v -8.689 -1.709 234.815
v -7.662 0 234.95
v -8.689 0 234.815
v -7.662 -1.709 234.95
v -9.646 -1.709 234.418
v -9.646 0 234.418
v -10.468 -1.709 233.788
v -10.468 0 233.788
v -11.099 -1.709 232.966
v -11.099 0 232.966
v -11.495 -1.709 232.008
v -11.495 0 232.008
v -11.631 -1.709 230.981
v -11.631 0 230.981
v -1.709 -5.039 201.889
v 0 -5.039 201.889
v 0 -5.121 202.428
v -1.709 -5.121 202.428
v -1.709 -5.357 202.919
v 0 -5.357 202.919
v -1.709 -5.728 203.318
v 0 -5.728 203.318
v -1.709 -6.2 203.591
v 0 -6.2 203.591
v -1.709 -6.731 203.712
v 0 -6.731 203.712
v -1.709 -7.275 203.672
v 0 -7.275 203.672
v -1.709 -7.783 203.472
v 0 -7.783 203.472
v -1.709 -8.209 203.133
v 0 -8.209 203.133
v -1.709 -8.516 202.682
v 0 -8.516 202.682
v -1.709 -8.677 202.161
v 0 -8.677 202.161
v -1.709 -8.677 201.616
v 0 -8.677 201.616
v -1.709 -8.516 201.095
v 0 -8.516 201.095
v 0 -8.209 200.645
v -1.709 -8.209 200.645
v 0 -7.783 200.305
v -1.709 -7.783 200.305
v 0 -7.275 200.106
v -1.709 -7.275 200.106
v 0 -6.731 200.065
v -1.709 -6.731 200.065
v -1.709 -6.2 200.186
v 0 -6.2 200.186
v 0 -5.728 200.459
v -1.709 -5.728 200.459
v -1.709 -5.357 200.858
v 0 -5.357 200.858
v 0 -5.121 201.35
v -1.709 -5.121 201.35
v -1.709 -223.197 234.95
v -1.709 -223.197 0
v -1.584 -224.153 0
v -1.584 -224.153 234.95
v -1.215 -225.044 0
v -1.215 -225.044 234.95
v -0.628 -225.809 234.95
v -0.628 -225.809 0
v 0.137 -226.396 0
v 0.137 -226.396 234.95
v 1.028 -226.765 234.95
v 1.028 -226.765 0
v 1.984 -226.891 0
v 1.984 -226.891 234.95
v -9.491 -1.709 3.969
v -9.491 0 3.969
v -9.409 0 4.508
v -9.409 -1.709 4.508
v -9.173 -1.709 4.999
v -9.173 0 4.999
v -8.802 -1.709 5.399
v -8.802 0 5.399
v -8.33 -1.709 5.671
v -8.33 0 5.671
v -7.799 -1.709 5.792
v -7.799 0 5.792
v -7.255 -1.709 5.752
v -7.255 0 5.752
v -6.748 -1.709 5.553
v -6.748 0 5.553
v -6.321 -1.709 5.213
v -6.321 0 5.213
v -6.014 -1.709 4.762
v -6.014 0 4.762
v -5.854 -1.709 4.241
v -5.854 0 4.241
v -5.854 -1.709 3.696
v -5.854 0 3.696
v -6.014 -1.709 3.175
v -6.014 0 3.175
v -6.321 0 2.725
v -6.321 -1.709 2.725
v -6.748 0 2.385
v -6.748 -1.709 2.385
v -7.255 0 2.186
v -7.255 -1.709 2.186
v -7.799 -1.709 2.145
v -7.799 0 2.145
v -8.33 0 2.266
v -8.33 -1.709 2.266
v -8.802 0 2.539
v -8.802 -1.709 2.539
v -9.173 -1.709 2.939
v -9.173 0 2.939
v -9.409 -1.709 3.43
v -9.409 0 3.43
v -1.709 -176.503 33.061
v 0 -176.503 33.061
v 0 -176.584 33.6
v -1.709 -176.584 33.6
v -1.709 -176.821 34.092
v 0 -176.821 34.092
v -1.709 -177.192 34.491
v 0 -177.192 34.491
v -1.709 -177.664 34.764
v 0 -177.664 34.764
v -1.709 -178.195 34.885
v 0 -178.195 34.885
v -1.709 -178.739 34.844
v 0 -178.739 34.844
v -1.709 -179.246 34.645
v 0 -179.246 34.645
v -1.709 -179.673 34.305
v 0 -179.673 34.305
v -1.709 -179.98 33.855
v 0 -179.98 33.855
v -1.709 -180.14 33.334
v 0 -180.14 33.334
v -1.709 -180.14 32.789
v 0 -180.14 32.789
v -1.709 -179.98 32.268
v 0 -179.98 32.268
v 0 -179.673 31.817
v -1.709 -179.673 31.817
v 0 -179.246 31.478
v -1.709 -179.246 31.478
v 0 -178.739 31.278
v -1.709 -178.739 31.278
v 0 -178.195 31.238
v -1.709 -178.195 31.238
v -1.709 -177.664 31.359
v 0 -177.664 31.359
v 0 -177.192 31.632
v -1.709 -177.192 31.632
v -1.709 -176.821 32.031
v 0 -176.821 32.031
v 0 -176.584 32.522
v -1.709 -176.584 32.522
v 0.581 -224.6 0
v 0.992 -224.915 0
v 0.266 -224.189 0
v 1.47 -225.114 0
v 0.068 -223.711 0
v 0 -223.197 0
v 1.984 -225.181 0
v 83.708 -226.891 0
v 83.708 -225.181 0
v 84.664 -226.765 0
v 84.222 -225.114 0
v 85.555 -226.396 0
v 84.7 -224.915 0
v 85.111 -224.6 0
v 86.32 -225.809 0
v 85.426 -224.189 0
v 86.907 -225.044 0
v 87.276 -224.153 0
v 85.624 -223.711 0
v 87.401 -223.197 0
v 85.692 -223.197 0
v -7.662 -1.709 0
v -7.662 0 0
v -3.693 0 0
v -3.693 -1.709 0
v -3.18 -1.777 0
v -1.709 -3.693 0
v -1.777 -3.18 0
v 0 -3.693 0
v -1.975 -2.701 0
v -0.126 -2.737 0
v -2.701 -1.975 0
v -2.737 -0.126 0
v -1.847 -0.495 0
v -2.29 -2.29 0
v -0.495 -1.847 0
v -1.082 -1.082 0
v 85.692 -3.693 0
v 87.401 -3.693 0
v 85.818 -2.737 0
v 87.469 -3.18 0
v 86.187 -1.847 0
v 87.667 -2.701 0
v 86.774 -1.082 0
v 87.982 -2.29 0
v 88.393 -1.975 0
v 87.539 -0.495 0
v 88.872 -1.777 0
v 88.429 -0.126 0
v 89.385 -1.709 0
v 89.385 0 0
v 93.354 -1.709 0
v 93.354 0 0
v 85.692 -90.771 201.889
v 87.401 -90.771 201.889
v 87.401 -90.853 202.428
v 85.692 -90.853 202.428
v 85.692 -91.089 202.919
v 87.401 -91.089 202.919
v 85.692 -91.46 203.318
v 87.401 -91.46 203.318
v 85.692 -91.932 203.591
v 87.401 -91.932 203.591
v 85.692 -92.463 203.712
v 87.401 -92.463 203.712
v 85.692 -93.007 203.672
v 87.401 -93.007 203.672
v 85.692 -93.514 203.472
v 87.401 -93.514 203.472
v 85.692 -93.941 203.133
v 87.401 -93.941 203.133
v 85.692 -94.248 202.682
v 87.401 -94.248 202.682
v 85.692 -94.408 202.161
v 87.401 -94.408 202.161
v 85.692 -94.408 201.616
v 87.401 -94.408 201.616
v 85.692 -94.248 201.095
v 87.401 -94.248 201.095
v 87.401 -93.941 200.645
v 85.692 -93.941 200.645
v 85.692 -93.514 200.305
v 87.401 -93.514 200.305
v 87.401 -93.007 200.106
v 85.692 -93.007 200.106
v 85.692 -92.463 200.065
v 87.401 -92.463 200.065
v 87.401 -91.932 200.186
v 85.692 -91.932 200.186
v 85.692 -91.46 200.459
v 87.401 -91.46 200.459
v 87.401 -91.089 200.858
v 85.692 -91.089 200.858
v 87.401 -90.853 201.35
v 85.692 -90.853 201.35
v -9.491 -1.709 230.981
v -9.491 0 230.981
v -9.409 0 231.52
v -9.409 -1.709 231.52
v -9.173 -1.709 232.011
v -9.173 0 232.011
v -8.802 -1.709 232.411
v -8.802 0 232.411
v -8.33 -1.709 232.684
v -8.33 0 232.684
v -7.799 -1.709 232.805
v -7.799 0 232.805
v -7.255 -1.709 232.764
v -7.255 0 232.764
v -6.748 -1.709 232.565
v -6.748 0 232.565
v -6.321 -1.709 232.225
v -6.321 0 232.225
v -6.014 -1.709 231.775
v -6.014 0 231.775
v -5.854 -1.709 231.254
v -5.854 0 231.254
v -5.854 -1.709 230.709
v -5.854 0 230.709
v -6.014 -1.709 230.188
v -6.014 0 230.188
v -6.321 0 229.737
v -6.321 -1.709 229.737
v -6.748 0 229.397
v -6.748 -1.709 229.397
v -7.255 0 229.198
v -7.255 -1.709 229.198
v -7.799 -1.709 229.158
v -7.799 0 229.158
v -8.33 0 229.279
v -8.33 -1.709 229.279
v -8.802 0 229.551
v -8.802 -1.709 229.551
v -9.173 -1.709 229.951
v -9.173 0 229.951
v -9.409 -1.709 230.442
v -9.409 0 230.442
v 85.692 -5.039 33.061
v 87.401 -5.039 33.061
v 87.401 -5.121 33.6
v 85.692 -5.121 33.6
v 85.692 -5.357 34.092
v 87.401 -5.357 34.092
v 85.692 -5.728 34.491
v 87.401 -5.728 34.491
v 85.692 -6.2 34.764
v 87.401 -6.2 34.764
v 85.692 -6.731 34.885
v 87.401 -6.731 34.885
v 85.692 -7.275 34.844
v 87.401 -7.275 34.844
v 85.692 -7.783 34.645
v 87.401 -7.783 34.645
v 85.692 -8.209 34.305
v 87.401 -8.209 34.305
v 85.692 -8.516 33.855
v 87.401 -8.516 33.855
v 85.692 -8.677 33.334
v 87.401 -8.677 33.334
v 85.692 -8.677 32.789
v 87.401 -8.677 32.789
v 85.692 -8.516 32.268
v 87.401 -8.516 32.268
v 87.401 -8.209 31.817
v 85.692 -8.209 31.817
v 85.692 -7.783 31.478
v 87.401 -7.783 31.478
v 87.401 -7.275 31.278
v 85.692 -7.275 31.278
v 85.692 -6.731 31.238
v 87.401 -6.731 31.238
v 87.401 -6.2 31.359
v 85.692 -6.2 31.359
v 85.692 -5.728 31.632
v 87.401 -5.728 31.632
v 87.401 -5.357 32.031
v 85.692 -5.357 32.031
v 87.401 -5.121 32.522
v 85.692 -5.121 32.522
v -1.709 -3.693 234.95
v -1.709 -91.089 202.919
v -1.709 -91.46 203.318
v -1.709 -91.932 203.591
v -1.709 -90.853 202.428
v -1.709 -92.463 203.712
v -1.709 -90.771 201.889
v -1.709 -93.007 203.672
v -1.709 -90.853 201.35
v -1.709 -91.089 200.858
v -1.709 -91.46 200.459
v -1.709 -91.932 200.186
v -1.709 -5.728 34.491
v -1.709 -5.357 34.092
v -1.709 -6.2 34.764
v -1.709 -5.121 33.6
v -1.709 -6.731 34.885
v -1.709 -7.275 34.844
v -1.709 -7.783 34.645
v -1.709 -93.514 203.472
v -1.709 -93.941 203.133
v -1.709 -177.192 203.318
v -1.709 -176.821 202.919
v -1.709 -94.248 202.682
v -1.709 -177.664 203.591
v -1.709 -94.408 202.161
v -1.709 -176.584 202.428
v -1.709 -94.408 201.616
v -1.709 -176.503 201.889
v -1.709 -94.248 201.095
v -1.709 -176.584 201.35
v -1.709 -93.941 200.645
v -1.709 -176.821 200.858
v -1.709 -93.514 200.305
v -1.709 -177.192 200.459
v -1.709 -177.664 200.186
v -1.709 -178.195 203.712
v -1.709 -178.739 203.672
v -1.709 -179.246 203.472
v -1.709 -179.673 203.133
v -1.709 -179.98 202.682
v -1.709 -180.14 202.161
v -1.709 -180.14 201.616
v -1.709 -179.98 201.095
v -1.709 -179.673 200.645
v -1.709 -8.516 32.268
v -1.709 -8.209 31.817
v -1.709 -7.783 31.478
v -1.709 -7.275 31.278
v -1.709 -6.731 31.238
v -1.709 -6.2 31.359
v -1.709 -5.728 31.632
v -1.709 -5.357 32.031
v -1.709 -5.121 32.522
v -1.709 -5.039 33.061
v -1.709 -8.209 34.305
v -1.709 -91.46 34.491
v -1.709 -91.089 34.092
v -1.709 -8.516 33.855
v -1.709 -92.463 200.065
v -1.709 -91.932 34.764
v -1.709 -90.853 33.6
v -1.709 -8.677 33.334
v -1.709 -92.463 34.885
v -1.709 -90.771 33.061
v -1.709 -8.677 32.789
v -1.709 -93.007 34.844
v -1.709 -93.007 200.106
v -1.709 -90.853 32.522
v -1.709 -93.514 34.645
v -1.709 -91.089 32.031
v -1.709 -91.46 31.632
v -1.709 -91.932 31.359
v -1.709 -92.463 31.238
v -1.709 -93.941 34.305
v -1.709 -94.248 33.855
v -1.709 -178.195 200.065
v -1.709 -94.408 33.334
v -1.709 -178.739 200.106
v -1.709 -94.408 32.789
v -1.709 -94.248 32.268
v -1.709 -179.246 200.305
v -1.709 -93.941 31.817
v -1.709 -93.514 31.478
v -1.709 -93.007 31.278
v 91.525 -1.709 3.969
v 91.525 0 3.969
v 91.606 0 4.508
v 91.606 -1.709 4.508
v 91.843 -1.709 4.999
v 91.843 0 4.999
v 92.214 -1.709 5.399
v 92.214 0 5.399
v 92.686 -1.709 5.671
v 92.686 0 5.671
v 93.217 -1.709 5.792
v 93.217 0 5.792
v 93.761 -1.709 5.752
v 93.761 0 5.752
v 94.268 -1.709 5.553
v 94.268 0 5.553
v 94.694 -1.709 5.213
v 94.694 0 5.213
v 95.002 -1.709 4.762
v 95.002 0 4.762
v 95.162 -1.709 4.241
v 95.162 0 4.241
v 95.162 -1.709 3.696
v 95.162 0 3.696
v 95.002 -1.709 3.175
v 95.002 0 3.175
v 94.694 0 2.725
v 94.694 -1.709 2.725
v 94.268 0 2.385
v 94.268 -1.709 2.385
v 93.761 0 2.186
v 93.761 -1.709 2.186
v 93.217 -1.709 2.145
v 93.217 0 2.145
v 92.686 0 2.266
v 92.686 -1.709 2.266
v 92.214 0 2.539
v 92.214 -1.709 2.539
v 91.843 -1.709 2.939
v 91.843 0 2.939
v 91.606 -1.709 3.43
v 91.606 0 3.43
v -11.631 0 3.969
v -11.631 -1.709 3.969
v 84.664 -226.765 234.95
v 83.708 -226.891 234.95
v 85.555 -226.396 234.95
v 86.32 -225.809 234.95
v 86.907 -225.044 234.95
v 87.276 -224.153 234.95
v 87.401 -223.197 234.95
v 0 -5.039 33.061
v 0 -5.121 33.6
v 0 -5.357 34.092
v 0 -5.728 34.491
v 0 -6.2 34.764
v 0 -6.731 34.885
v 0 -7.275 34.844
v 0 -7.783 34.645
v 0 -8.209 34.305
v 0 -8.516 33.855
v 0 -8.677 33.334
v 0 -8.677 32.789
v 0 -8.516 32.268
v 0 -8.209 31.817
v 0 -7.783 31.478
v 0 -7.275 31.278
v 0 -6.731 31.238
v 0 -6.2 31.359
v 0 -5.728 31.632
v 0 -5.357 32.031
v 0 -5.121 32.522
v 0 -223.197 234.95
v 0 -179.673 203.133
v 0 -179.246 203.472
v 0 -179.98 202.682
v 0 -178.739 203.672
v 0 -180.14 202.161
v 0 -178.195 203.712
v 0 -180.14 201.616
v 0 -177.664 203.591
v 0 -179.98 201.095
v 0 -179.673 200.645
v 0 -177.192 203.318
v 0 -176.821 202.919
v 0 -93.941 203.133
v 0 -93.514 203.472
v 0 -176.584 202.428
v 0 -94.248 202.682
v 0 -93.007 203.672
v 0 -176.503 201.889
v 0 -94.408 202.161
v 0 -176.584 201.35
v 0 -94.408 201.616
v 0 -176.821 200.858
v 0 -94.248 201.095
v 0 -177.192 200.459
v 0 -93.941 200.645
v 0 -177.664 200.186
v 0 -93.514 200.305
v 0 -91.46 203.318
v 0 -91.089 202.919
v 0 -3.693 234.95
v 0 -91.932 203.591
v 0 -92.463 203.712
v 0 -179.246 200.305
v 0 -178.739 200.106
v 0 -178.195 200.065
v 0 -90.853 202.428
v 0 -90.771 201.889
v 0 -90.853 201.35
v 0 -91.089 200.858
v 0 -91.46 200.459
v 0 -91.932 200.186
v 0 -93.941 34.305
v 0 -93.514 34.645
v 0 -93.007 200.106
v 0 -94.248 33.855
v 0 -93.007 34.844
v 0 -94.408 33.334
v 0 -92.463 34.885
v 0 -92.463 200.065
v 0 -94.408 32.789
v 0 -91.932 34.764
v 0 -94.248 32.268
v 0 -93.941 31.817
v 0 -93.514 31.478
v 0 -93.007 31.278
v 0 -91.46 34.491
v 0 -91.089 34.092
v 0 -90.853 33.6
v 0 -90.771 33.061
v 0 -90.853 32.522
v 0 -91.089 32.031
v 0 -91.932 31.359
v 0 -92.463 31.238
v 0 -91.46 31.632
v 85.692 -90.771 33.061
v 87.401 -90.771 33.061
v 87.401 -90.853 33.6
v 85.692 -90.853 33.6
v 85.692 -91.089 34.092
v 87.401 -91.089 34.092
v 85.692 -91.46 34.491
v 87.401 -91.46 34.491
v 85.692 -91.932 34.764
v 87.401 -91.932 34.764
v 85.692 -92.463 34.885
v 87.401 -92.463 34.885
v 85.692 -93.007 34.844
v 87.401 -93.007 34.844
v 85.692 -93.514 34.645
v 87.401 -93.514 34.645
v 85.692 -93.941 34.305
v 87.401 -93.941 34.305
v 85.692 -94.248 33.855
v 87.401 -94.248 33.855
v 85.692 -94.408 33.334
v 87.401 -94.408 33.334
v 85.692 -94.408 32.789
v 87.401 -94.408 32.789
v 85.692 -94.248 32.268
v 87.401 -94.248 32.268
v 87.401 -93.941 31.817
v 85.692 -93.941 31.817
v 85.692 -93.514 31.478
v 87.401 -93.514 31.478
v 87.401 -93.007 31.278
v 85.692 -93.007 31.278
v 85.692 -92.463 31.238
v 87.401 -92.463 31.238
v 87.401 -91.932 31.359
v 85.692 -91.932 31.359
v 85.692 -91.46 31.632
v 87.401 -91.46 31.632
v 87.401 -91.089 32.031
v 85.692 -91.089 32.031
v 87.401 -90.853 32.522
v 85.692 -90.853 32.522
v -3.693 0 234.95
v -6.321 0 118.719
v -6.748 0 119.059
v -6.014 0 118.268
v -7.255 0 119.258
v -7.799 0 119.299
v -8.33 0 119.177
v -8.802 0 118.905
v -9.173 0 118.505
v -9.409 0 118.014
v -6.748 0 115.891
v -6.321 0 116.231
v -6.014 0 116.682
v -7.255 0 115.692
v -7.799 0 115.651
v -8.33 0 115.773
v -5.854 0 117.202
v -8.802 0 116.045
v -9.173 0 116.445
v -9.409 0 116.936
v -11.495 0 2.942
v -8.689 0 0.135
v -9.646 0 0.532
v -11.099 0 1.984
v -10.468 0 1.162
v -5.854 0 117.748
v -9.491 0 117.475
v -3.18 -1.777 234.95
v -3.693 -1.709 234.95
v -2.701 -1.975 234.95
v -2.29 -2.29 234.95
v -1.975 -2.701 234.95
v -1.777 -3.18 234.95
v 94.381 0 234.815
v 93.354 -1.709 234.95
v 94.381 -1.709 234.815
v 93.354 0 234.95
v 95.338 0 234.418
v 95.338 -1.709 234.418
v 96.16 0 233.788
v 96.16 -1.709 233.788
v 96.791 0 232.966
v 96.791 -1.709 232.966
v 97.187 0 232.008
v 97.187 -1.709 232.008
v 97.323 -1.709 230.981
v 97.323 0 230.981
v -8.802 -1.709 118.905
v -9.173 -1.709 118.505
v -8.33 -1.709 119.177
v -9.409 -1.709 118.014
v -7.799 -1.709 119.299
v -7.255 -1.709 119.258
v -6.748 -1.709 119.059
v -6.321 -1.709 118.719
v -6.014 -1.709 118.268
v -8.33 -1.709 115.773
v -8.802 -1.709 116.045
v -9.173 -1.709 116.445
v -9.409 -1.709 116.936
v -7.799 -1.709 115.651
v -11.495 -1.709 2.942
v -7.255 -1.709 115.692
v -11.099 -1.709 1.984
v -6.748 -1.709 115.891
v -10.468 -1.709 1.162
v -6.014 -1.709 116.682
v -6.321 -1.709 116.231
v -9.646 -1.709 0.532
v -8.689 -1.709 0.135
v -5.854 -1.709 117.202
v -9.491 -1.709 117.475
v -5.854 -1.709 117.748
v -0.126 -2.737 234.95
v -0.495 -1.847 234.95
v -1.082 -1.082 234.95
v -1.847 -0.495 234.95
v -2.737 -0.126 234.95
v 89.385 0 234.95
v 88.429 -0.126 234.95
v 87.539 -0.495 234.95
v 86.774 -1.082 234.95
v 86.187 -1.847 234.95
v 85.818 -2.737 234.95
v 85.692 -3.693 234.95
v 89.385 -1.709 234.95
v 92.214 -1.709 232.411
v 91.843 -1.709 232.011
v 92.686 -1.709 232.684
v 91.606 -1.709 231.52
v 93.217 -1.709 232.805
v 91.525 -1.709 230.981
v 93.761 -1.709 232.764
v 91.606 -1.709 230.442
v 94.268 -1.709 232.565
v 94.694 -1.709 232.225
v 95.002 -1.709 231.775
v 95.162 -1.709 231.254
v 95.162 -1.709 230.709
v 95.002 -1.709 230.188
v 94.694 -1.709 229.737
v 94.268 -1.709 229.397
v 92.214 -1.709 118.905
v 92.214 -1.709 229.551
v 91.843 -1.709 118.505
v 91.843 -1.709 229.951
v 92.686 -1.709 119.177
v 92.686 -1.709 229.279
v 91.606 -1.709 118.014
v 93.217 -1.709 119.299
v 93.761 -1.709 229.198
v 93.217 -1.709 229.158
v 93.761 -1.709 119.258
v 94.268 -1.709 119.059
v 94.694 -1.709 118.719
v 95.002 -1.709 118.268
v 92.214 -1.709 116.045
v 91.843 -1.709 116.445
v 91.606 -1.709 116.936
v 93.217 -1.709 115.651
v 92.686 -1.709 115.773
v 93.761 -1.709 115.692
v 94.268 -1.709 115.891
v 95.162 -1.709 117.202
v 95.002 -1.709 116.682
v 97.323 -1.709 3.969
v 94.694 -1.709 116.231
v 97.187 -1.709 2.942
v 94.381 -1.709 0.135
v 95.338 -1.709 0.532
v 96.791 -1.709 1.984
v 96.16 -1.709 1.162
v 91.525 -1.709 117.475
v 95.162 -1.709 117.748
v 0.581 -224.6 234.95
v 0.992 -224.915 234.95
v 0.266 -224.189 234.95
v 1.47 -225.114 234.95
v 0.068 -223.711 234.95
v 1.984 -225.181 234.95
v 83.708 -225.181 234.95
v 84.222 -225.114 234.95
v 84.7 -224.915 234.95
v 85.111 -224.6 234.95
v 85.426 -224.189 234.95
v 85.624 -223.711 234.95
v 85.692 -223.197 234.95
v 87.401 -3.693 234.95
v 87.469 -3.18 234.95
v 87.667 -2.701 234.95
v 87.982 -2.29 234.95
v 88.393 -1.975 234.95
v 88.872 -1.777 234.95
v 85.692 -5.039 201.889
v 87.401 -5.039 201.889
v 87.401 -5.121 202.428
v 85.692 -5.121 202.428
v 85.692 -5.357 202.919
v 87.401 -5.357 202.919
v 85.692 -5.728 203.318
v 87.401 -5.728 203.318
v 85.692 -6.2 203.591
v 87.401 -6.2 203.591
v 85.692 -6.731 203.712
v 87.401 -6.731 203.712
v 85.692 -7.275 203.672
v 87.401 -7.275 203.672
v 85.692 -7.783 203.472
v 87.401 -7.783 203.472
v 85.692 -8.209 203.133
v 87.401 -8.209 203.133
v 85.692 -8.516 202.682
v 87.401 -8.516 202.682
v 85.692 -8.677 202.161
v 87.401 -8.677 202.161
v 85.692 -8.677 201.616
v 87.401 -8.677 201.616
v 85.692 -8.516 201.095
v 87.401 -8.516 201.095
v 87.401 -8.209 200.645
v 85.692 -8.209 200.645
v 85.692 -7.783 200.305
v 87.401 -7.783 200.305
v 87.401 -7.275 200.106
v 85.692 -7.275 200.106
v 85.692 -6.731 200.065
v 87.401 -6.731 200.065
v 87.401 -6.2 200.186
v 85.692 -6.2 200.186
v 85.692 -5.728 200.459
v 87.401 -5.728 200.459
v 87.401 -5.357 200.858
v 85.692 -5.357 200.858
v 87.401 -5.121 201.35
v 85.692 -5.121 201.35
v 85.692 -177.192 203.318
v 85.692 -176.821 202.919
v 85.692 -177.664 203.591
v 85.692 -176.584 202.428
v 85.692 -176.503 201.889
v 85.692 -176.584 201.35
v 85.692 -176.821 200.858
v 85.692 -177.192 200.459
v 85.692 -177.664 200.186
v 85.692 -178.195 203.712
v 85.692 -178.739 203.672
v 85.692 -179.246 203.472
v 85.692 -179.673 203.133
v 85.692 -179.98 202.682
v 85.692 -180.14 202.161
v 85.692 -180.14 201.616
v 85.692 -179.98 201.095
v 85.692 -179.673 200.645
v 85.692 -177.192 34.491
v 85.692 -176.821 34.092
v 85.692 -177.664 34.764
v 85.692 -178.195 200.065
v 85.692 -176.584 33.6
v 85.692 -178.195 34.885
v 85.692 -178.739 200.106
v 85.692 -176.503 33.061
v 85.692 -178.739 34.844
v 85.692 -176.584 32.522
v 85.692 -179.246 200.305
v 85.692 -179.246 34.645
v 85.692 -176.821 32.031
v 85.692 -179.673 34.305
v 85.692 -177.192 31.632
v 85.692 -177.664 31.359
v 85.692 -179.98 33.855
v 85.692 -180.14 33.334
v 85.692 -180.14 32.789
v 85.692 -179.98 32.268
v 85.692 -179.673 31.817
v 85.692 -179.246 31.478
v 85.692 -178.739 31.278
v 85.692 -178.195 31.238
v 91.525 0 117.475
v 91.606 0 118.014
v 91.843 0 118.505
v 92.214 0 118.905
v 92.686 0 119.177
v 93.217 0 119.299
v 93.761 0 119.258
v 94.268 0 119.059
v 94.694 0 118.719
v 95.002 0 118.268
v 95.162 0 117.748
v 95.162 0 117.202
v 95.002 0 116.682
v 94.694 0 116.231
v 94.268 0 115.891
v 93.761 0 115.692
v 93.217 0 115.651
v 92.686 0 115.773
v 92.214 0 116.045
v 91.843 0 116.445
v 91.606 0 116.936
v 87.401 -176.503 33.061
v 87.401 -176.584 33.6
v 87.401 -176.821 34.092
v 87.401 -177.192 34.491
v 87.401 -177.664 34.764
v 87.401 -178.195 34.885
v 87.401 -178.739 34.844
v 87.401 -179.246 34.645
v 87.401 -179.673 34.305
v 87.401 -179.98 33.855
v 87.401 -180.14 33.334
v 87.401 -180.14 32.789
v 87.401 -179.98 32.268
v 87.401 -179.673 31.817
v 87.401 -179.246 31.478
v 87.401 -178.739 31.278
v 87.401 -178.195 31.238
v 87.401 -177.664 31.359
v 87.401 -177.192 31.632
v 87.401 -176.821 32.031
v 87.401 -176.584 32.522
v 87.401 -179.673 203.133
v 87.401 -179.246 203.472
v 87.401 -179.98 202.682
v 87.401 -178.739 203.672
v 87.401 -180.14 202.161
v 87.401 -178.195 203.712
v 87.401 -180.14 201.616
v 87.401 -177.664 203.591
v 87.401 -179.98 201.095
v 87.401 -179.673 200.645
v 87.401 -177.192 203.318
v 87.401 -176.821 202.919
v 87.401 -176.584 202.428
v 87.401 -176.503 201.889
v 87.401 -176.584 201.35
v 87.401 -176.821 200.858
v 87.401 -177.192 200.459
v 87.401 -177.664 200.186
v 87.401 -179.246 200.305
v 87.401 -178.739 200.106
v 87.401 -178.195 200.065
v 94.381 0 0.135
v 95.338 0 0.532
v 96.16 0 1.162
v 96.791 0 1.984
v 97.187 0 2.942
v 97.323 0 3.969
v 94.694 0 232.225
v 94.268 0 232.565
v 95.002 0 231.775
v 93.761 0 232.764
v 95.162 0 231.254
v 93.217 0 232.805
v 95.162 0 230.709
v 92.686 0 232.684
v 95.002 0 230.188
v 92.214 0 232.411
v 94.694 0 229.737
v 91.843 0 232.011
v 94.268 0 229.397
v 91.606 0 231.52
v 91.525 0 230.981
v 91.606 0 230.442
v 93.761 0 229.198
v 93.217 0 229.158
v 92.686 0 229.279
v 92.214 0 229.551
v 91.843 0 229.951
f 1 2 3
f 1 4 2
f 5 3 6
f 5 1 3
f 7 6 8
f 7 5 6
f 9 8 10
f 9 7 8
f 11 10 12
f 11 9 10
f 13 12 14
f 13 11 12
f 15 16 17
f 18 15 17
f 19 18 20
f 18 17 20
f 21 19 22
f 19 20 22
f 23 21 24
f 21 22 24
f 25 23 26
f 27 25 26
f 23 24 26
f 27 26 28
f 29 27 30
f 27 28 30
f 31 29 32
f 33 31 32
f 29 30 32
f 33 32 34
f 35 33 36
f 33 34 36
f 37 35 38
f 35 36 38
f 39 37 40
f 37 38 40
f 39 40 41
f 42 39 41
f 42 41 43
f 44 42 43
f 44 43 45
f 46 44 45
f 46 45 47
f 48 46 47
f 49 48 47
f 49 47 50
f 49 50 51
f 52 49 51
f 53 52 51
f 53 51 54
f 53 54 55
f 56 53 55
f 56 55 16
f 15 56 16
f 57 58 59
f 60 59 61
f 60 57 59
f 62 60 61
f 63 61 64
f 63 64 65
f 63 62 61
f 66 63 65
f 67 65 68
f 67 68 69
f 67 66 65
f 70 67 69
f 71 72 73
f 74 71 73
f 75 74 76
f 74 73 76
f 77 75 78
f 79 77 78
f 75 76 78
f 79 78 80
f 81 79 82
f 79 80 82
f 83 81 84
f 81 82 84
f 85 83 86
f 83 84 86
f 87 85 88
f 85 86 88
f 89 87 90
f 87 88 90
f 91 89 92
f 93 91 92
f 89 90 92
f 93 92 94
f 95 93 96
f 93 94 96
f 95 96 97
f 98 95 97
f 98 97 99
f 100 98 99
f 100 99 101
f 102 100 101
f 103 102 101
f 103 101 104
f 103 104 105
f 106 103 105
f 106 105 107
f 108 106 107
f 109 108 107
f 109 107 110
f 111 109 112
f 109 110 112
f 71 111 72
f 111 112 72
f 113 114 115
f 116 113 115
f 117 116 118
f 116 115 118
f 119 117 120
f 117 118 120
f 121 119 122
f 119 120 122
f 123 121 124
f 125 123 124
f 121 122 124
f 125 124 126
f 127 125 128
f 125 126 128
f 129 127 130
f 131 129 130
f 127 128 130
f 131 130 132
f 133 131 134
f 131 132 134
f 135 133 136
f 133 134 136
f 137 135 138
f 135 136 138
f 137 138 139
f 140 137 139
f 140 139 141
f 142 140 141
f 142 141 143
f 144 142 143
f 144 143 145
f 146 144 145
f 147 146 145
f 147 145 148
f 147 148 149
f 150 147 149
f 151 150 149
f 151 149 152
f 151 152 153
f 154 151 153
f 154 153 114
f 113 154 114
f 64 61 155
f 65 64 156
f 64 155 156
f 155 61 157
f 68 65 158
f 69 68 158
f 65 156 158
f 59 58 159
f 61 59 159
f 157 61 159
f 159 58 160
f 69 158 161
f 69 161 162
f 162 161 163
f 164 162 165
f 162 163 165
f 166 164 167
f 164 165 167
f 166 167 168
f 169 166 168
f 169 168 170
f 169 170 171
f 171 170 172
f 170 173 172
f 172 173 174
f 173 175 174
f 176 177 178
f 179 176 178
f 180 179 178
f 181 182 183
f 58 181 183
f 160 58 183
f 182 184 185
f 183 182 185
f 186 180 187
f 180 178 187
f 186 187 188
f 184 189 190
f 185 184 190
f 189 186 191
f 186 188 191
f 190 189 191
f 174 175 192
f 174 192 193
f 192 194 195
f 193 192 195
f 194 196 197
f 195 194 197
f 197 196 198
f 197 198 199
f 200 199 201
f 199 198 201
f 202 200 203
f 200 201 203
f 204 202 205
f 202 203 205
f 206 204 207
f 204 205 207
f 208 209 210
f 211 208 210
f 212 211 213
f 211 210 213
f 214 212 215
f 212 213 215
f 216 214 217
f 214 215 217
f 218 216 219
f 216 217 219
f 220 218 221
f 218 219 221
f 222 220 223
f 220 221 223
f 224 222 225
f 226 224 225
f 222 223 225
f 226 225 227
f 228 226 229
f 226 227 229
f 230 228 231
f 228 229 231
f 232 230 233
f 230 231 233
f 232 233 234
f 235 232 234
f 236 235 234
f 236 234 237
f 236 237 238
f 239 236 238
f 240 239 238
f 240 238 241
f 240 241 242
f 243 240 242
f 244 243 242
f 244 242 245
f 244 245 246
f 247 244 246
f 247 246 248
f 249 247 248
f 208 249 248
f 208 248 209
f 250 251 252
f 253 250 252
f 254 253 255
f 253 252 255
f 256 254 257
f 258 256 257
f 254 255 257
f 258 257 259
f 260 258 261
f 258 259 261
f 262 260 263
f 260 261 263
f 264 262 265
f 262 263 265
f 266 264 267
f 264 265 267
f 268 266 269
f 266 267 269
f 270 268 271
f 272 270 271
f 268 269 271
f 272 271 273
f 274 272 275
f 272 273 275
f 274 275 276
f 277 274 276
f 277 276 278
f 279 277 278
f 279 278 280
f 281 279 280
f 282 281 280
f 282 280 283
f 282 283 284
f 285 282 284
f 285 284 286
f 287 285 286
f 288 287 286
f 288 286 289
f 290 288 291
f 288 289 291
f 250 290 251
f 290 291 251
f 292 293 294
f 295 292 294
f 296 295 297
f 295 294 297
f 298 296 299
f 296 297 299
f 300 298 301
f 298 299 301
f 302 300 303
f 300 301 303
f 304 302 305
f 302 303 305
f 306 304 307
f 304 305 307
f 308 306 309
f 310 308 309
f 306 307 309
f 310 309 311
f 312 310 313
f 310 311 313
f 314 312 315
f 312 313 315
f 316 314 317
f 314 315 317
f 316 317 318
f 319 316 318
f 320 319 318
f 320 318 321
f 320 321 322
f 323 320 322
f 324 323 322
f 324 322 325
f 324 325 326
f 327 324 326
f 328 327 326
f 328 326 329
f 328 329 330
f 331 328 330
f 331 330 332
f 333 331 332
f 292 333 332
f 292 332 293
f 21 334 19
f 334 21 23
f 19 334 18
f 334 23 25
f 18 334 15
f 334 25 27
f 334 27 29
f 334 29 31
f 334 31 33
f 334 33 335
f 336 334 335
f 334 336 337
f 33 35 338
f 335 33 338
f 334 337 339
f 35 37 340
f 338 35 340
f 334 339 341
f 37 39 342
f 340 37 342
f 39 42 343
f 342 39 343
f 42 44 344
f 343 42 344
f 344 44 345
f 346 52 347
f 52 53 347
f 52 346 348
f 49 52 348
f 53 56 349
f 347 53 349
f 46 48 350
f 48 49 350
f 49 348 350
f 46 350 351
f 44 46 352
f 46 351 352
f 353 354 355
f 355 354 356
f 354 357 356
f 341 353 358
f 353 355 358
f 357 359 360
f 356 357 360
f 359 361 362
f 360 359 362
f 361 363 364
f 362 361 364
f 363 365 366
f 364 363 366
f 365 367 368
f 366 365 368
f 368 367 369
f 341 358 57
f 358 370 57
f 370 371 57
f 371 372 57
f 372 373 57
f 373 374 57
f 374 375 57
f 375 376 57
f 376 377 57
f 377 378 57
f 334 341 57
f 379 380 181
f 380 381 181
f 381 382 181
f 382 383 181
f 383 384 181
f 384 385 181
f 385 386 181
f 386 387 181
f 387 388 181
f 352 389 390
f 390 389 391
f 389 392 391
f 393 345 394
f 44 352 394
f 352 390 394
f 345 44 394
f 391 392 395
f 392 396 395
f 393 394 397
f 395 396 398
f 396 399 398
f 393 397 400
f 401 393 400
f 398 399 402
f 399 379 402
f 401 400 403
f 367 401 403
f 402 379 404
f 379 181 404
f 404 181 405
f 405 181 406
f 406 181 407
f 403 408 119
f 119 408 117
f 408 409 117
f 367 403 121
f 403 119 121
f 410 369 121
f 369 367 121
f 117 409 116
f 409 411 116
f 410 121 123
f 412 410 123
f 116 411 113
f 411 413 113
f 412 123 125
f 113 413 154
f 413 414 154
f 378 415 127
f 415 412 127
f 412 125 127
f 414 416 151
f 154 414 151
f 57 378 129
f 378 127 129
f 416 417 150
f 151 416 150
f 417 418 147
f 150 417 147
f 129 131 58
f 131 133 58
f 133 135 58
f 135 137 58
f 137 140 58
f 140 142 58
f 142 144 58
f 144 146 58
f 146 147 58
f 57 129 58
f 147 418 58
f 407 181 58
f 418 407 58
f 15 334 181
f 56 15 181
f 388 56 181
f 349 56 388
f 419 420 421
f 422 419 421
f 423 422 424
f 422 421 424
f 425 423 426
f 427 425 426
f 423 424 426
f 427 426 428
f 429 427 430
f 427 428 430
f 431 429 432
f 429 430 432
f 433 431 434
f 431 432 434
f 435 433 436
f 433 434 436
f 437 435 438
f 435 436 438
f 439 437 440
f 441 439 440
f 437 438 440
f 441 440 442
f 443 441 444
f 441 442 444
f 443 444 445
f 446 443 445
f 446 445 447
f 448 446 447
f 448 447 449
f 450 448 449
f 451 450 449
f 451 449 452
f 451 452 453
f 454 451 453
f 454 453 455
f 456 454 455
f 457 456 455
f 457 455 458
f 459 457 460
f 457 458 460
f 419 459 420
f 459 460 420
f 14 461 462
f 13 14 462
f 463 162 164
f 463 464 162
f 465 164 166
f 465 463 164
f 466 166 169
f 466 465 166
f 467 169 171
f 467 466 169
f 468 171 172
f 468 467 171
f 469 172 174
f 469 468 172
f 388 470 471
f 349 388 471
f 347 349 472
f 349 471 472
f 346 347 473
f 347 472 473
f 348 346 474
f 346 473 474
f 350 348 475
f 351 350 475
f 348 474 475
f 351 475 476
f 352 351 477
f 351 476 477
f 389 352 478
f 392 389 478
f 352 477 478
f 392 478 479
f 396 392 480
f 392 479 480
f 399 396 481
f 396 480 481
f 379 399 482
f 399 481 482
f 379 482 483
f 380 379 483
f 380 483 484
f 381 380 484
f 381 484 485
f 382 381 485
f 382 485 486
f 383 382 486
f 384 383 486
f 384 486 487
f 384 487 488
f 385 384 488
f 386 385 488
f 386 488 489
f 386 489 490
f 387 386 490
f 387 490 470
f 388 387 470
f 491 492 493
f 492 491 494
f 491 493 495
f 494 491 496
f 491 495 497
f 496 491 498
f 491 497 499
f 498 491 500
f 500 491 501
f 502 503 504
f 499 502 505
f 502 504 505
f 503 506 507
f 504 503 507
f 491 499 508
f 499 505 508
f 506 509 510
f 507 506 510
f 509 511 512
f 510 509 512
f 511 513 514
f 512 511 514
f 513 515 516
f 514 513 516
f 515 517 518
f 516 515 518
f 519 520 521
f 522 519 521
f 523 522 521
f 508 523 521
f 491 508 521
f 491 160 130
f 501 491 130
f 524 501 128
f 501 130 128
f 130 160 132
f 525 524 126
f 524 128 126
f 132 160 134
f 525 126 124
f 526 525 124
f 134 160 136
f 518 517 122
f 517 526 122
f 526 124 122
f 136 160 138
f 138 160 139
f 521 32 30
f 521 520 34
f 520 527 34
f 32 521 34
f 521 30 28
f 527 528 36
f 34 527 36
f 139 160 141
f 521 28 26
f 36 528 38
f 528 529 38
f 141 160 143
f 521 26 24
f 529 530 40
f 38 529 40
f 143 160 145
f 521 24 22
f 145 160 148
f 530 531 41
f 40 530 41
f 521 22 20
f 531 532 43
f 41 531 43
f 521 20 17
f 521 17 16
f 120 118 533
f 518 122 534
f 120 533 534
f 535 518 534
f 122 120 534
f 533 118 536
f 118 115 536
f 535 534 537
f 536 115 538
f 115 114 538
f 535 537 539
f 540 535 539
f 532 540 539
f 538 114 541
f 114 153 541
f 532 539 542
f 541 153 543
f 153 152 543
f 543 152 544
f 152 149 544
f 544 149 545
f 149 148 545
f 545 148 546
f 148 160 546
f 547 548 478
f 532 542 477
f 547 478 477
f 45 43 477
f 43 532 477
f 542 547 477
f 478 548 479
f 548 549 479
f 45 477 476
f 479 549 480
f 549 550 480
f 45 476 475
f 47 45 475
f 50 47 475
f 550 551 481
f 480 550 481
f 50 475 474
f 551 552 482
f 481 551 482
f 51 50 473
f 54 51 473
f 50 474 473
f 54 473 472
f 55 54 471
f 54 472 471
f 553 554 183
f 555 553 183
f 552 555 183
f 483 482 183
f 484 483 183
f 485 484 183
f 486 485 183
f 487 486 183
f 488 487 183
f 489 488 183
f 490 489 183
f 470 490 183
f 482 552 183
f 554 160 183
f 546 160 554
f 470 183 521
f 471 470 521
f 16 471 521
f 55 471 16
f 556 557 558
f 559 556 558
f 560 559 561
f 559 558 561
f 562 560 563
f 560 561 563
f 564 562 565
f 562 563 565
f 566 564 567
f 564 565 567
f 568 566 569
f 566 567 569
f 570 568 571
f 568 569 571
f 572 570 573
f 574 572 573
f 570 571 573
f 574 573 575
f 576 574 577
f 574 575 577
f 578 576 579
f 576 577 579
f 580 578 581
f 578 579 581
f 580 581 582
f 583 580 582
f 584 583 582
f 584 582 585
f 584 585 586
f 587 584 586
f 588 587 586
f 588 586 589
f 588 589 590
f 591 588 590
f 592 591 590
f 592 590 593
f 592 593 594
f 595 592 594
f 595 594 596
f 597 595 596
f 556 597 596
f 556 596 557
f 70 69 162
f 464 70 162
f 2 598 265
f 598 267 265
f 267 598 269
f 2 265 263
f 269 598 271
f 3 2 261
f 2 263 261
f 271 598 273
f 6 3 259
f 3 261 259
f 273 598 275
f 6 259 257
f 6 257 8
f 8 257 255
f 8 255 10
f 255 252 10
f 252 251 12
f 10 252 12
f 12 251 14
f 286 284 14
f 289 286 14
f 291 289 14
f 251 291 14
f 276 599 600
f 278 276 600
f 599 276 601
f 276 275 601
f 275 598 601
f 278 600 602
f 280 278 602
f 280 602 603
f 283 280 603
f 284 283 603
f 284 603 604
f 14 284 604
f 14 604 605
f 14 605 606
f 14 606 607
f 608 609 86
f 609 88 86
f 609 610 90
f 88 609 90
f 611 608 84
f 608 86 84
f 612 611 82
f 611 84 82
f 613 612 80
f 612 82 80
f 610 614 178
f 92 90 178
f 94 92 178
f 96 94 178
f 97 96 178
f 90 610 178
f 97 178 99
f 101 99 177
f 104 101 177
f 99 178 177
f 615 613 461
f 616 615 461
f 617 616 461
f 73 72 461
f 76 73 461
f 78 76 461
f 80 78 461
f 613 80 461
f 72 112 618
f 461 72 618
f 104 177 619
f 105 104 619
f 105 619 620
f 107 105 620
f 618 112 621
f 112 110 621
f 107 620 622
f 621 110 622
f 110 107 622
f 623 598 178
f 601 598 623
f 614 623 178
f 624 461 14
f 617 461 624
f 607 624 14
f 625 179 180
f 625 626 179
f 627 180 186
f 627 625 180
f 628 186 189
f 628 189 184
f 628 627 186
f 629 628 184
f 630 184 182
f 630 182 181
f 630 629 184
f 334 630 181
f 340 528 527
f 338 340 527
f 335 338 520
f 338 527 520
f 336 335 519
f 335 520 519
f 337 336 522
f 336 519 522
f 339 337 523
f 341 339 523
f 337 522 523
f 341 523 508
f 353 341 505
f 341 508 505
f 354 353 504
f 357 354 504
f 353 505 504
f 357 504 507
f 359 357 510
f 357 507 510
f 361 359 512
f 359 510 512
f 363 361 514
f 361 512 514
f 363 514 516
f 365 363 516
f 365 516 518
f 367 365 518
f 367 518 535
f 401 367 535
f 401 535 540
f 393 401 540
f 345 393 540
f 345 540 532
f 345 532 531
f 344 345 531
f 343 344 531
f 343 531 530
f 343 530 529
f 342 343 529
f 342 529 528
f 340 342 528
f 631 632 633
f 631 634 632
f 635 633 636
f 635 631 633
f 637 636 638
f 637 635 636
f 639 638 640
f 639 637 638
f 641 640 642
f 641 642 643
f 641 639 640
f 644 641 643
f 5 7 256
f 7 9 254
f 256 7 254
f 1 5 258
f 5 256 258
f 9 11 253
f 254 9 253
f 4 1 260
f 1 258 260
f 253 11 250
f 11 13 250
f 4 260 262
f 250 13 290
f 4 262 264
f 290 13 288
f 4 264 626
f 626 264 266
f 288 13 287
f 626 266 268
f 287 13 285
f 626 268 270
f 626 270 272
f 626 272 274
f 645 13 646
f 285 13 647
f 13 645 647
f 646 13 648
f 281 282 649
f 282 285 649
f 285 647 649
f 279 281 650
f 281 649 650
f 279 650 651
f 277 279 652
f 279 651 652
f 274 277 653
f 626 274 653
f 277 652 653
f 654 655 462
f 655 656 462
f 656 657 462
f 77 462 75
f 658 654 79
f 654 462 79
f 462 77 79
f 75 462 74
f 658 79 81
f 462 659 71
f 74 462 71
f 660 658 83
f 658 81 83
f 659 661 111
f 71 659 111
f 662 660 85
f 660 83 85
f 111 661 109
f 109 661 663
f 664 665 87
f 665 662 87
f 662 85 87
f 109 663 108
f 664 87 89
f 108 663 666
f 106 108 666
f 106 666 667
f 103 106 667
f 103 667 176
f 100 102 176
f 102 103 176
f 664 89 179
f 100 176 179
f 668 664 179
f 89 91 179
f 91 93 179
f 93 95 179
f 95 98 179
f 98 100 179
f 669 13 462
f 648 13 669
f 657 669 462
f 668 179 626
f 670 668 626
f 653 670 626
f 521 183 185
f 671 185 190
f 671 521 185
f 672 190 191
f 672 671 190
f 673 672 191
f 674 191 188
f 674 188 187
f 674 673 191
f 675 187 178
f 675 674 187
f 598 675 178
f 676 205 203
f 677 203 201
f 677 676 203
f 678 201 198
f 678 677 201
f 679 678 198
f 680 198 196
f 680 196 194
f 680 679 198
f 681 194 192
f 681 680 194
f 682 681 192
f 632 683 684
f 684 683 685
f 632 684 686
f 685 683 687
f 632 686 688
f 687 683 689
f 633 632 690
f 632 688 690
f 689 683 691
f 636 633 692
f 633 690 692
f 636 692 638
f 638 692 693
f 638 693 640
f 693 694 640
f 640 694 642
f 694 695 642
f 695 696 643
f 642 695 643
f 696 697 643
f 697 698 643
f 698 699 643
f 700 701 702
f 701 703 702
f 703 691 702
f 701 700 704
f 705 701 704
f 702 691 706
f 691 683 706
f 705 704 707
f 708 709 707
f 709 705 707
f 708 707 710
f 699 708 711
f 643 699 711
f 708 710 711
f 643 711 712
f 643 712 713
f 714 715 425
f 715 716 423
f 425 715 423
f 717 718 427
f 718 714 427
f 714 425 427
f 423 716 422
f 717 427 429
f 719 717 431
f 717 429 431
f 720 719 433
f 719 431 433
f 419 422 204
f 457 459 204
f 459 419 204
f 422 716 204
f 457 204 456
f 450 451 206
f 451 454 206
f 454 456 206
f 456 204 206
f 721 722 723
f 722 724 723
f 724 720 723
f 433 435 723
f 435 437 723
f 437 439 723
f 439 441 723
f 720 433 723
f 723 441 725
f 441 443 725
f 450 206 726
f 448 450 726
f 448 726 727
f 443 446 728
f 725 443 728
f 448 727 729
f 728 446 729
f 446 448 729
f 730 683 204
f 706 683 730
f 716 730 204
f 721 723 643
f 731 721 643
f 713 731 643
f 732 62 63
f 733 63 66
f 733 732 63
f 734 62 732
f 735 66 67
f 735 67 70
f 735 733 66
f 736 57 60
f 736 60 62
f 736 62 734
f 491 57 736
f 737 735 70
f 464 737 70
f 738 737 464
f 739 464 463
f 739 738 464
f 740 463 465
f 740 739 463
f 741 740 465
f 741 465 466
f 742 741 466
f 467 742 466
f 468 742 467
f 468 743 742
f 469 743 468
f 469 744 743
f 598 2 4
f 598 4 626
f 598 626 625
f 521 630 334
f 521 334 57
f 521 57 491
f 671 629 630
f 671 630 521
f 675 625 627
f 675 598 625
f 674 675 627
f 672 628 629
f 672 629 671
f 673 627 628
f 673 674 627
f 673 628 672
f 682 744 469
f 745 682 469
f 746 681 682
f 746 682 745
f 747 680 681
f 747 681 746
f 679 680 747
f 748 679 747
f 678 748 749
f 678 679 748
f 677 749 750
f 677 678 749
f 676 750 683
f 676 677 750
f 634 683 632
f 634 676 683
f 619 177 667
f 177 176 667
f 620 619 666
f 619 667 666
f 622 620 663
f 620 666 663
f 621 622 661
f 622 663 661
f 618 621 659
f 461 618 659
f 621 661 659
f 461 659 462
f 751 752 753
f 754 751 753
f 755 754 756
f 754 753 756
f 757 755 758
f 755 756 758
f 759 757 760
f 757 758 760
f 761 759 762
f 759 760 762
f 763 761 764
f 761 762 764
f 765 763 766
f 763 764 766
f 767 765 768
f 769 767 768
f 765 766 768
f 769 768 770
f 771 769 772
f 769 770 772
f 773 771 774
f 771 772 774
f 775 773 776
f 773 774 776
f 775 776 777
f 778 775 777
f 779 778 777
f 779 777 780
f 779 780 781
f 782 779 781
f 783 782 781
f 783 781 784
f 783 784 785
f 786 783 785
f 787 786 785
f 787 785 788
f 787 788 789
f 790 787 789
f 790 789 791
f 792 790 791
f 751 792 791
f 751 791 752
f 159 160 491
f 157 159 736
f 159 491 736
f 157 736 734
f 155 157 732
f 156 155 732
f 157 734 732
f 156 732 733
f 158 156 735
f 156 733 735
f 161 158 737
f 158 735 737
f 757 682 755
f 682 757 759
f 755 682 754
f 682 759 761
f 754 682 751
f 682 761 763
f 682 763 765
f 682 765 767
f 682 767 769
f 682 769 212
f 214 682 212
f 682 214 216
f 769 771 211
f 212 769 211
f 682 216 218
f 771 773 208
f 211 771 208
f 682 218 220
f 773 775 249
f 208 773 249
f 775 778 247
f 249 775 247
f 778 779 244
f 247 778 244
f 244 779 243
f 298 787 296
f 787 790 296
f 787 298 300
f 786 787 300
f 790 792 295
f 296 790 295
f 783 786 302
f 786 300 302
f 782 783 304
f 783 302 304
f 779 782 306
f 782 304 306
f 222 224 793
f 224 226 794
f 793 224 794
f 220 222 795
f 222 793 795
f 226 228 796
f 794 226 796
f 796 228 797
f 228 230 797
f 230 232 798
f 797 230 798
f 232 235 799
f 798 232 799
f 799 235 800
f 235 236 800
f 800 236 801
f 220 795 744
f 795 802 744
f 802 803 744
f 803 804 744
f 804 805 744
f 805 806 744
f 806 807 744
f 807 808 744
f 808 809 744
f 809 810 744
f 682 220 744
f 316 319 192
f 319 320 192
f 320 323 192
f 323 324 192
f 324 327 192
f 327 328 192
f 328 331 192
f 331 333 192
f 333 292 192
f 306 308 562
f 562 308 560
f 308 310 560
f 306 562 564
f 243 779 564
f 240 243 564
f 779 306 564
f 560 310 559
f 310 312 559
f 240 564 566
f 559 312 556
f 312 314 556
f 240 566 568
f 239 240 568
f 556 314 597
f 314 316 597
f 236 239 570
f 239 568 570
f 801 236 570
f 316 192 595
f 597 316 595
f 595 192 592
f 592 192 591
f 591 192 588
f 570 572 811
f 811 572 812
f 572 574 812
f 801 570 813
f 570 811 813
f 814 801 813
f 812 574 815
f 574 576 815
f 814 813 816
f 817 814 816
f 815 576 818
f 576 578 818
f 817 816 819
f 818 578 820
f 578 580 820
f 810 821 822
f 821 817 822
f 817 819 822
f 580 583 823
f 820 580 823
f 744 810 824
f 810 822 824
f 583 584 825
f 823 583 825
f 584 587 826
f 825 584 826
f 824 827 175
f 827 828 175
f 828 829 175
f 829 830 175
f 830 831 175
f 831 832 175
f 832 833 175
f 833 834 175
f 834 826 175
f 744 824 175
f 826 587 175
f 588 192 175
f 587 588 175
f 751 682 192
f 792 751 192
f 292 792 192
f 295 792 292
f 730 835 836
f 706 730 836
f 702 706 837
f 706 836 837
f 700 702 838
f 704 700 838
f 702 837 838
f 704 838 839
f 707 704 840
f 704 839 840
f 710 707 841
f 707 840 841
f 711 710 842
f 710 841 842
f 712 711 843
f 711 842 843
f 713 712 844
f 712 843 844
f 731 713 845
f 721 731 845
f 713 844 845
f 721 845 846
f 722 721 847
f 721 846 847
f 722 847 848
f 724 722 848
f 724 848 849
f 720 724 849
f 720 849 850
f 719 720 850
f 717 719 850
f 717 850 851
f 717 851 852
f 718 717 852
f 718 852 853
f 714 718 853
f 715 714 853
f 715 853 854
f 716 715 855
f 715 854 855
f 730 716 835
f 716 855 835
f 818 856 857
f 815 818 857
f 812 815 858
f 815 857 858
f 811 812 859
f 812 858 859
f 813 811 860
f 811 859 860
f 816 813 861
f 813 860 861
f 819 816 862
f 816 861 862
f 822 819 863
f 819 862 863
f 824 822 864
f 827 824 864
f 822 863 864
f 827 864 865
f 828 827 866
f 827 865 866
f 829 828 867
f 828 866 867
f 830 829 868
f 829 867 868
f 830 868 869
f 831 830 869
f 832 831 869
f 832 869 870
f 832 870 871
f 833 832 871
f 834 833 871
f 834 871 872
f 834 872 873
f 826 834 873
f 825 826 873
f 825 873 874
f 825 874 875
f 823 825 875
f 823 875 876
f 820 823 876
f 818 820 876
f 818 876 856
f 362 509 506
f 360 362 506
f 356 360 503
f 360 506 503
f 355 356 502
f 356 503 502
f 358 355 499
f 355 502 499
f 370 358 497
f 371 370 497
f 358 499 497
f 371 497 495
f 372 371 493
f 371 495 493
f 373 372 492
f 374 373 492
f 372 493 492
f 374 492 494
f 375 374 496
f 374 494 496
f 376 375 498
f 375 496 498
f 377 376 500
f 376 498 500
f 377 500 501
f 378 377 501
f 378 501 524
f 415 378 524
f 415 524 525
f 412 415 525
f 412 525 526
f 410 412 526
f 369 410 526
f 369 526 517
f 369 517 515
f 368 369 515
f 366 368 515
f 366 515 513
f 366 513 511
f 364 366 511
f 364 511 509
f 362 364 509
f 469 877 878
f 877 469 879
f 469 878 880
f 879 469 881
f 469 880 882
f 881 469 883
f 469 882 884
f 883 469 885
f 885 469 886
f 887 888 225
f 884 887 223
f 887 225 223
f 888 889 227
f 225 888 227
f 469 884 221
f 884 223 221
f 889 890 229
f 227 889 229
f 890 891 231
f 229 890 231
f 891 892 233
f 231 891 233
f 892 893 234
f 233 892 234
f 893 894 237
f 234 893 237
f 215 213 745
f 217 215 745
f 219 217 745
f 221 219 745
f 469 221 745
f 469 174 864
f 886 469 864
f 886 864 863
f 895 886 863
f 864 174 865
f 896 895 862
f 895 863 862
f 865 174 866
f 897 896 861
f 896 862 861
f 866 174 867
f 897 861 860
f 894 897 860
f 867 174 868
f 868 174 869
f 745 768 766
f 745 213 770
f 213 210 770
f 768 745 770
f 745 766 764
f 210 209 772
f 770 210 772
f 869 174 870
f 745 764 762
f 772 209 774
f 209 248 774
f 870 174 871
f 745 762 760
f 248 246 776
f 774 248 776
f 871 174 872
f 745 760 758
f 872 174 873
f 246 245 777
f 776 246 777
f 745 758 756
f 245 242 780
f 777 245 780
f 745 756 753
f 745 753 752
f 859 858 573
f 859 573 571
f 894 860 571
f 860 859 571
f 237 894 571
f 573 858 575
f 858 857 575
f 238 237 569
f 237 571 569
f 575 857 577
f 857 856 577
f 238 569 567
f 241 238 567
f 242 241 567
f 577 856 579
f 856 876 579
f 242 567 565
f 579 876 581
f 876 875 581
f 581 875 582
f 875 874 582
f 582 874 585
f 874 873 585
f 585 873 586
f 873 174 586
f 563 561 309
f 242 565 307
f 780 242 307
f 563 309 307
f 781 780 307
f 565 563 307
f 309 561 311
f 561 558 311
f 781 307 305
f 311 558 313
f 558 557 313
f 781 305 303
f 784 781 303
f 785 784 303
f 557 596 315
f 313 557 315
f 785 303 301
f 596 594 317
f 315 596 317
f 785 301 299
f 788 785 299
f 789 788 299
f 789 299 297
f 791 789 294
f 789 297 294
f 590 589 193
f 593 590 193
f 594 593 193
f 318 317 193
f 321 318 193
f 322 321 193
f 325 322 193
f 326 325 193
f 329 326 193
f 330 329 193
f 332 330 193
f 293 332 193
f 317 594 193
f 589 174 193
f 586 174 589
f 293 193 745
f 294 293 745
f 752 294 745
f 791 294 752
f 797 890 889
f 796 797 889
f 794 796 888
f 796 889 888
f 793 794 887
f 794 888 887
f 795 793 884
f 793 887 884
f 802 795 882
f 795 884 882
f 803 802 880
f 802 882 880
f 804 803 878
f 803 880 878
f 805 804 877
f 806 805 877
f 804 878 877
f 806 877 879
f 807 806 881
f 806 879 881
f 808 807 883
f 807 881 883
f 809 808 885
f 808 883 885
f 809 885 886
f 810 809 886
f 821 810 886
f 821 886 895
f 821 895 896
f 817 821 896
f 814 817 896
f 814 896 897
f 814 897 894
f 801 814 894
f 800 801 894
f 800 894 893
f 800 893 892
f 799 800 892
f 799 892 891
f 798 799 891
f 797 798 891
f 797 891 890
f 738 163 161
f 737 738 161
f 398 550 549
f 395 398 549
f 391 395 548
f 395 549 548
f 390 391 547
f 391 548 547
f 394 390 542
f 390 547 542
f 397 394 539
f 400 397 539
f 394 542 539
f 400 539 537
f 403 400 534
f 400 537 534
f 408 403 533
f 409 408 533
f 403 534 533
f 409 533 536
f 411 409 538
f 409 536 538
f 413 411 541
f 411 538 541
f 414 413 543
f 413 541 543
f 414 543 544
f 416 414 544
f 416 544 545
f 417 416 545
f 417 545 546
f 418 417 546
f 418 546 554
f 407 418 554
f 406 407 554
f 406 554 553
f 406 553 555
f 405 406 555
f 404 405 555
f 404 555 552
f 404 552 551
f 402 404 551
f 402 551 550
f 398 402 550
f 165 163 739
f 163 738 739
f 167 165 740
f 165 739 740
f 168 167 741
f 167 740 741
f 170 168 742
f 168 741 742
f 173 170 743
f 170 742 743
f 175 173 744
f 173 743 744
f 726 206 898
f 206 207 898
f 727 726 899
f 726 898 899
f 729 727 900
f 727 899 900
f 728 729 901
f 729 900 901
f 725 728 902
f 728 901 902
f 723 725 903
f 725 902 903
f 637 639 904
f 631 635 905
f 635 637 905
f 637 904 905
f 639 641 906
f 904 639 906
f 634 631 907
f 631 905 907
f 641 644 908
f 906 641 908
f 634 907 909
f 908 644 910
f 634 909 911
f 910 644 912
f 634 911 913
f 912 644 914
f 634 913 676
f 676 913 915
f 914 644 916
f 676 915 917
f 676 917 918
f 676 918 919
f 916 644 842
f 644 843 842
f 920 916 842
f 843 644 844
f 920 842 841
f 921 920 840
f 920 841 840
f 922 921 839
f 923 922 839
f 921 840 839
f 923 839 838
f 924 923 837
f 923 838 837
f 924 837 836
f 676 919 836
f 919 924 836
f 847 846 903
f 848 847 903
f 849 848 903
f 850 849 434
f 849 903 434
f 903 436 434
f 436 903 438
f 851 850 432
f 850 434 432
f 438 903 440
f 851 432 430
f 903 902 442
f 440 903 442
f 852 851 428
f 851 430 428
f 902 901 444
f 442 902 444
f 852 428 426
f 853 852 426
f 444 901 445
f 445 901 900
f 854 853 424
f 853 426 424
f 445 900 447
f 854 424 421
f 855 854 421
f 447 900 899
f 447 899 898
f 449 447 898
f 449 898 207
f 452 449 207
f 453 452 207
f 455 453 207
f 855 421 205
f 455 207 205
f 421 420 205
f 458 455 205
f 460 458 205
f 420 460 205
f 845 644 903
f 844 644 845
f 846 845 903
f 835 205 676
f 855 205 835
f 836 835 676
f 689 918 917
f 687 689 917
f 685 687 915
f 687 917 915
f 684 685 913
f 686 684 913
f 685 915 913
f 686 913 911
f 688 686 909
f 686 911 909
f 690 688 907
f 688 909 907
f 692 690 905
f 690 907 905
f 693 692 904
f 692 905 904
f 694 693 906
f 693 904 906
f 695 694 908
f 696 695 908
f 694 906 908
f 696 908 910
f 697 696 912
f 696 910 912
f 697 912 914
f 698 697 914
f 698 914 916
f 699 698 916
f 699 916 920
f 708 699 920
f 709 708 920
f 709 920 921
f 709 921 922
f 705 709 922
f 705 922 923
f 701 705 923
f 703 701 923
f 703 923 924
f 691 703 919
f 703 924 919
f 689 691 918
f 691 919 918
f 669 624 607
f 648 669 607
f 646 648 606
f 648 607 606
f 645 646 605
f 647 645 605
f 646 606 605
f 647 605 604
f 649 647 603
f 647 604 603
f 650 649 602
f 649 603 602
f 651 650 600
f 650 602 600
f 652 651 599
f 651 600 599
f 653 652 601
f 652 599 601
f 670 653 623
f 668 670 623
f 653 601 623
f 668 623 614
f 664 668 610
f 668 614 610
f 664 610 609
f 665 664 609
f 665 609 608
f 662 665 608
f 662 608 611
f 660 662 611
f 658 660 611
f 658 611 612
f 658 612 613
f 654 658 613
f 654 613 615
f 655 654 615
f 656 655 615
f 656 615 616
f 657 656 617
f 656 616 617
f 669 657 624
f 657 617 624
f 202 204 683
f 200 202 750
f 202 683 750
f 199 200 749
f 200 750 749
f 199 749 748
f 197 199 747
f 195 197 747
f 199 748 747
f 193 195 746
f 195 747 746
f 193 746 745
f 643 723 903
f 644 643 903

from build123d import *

# Parameters (mm, degrees)
F1_DEPTH = 234.95
F2_R     = 3.69316
F3_R     = 1.98374
F4_R     = 3.96875
F5_R     = 1.8288
F6_DEPTH = 89.11082
F7_R     = 1.8288
F8_DEPTH = 1.70942


with BuildPart() as f1:
    # F0 (on Top) → F1 (new body)
    with BuildSketch(Plane.XY):
        Polygon((0, -225.18116), (0, 0), (-11.63066, 0), (-11.63066, -1.70942), (-1.70942, -1.70942), (-1.70942, -226.89058), (87.4014, -226.89058), (87.4014, -1.70942), (97.32264, -1.70942), (97.32264, 0), (85.69198, 0), (85.69198, -225.18116), align=None)
    extrude(amount=F1_DEPTH)

    # F2
    f2_edges = [f1.edges().sort_by_distance(p)[0] for p in [
        (-1.70942, -226.89058, 117.475),
        (87.4014, -226.89058, 117.475),
        (85.69198, 0, 117.475),
        (0, 0, 117.475),
    ]]
    fillet(f2_edges, radius=F2_R)

    # F3
    f3_edges = [f1.edges().sort_by_distance(p)[0] for p in [
        (0, -225.18116, 117.475),
        (85.69198, -225.18116, 117.475),
        (-1.70942, -1.70942, 117.475),
        (87.4014, -1.70942, 117.475),
    ]]
    fillet(f3_edges, radius=F3_R)

    # F4
    f4_edges = [f1.edges().sort_by_distance(p)[0] for p in [
        (-11.63066, -0.85471, 0),
        (-11.63066, -0.85471, 234.95),
        (97.32264, -0.85471, 234.95),
        (97.32264, -0.85471, 0),
    ]]
    fillet(f4_edges, radius=F4_R)

    # F5 (on face) → F6 (cut, through all)
    with BuildSketch(Plane.YZ.offset(87.4014)):
        with Locations((-6.86816, 33.061364)):
            Circle(F5_R)
        with Locations((-92.600069, 33.061364)):
            Circle(F5_R)
        with Locations((-178.331978, 33.061364)):
            Circle(F5_R)
        with Locations((-178.331978, 201.888636)):
            Circle(F5_R)
        with Locations((-92.600069, 201.888636)):
            Circle(F5_R)
        with Locations((-6.86816, 201.888636)):
            Circle(F5_R)
    extrude(amount=-F6_DEPTH, mode=Mode.SUBTRACT)

    # F7 (on face) → F8 (cut, through all)
    with BuildSketch(Plane(origin=(0, 0, 0), x_dir=(-1, 0, 0), z_dir=(0, 1, 0))):
        with Locations((-93.35389, 3.96875)):
            Circle(F7_R)
        with Locations((-93.35389, 117.475)):
            Circle(F7_R)
        with Locations((-93.35389, 230.98125)):
            Circle(F7_R)
        with Locations((7.66191, 230.98125)):
            Circle(F7_R)
        with Locations((7.66191, 117.475)):
            Circle(F7_R)
        with Locations((7.66191, 3.96875)):
            Circle(F7_R)
    extrude(amount=-F8_DEPTH, mode=Mode.SUBTRACT)


solid = f1.part
